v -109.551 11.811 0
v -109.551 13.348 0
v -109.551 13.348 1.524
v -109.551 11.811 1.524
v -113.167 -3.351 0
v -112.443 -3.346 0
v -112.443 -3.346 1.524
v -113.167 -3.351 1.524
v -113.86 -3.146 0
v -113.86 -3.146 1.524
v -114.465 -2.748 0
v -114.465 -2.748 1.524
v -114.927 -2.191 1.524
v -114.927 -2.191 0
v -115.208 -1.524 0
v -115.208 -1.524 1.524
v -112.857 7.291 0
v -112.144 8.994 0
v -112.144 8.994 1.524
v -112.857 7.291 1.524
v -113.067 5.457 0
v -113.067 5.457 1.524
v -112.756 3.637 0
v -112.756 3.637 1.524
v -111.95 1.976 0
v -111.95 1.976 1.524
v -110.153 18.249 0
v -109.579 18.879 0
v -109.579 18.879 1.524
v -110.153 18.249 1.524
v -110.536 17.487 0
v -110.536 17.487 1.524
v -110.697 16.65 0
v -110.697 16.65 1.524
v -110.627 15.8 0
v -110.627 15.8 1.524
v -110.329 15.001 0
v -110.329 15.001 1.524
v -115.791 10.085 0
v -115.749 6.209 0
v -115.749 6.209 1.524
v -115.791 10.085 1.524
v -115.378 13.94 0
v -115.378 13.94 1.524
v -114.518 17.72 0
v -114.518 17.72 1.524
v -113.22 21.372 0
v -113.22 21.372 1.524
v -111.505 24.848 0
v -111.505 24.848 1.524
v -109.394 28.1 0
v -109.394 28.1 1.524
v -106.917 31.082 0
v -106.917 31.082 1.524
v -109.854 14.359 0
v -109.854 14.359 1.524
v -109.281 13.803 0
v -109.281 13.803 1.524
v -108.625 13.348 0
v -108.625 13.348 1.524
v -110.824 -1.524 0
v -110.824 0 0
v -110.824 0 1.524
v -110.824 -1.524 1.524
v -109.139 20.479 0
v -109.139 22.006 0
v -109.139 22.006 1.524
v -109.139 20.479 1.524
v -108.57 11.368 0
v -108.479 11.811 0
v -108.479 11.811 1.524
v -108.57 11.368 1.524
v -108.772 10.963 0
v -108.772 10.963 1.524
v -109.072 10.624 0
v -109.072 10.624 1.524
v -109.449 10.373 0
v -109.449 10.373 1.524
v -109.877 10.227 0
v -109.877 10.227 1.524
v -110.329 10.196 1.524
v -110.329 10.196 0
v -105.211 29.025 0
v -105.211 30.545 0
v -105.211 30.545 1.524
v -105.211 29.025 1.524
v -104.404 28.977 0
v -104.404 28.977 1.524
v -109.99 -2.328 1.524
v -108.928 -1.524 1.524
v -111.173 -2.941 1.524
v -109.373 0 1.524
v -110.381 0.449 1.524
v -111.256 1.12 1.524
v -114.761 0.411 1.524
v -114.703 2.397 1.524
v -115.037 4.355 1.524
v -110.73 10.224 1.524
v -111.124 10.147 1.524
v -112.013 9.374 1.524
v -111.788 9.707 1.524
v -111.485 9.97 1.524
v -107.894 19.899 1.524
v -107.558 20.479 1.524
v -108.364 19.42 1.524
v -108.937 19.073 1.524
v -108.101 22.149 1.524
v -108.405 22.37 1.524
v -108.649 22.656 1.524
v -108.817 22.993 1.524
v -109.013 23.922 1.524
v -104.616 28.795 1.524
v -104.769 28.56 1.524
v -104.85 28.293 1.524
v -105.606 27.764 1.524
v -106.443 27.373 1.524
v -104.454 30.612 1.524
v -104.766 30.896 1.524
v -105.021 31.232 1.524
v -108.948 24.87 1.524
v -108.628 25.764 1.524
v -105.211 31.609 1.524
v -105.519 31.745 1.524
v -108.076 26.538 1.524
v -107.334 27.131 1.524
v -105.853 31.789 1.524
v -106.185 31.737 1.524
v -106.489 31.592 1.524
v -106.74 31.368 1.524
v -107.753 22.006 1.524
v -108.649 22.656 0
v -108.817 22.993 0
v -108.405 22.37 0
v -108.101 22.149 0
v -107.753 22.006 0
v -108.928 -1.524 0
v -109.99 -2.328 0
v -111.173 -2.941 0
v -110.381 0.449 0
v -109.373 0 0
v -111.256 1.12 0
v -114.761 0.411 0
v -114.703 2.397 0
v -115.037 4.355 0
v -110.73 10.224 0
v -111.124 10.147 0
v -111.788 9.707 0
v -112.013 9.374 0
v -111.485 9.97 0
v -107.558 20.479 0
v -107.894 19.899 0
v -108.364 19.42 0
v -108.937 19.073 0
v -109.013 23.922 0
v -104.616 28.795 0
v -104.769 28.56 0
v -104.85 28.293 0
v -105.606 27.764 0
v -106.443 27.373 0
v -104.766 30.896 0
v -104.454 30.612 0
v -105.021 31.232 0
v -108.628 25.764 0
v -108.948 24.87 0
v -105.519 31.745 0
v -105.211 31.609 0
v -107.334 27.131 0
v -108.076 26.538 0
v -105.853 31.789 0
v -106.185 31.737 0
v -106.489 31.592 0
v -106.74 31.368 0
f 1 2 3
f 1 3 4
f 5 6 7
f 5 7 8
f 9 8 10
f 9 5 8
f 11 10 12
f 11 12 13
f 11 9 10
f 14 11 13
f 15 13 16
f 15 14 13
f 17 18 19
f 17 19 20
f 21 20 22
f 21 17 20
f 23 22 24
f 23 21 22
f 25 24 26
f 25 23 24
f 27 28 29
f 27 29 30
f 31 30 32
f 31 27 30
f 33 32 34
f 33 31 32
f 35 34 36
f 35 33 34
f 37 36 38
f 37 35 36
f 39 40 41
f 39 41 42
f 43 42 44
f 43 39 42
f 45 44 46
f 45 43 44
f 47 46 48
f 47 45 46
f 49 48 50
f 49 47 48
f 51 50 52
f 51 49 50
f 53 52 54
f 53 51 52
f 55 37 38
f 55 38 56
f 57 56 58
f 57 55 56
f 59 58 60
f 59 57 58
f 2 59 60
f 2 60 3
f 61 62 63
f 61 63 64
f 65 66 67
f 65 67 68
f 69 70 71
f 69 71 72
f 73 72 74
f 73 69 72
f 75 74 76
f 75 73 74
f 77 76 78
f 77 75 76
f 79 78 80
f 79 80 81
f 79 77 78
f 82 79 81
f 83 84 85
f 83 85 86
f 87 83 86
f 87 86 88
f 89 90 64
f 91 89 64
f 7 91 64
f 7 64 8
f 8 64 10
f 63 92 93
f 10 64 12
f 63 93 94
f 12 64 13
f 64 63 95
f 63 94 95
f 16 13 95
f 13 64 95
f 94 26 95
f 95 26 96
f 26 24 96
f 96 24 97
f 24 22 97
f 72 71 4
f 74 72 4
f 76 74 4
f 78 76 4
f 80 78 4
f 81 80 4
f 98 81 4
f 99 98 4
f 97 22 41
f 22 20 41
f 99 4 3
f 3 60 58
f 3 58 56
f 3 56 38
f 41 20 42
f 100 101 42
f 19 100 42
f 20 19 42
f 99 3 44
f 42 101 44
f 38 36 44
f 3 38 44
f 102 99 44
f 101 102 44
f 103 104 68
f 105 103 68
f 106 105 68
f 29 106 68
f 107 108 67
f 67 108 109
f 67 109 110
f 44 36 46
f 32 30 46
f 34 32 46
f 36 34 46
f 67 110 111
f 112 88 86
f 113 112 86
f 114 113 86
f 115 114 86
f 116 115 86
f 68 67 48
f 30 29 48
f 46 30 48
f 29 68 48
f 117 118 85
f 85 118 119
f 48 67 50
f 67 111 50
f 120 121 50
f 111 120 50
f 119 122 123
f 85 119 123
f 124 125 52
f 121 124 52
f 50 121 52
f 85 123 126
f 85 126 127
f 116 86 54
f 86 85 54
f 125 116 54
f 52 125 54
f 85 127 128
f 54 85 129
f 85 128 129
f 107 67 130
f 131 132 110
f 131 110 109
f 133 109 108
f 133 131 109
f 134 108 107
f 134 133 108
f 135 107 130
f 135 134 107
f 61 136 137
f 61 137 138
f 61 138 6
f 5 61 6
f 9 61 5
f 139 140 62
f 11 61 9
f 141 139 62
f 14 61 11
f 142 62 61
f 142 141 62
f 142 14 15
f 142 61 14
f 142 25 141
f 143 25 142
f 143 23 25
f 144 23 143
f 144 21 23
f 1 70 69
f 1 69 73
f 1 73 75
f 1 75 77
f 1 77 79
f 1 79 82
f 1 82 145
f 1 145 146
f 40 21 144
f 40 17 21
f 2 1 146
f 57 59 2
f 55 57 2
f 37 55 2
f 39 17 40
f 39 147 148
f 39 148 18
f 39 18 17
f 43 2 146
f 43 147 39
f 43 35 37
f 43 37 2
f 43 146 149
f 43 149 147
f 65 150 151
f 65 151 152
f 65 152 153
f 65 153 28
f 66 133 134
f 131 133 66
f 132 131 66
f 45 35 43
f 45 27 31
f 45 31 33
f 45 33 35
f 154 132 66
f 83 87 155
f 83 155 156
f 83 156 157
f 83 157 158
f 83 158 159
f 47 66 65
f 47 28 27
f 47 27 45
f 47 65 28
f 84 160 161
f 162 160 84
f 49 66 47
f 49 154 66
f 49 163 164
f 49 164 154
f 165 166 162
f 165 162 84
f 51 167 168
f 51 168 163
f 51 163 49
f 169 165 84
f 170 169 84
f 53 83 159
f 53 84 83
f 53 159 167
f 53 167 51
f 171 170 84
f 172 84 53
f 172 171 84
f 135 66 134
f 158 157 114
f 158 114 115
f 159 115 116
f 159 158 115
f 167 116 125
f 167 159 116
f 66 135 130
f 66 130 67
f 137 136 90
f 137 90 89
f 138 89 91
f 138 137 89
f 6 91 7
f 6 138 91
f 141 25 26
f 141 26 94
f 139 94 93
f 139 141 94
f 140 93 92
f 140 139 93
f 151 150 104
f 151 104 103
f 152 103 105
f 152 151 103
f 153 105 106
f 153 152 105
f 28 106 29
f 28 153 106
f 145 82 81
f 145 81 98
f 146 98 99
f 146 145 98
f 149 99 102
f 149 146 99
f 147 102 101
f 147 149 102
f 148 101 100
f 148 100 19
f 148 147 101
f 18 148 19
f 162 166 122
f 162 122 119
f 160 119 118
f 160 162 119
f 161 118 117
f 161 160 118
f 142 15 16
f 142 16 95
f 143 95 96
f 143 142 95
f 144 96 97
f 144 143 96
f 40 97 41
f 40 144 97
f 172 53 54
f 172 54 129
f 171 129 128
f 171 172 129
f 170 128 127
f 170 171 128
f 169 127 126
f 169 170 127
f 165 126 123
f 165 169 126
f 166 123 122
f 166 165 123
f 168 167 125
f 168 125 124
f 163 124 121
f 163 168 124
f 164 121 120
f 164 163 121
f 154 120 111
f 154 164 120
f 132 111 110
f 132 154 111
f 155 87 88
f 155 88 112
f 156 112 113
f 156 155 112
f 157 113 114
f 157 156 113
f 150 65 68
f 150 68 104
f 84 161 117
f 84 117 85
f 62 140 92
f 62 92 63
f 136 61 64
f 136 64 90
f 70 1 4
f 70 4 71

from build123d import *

# Parameters (mm, degrees)
BOSS_EXTRUDE1_DEPTH = 1.524


with BuildPart() as part:
    # Sketch1 → Boss-Extrude1 (new body)
    with BuildSketch(Plane.XY):
        with BuildLine():
            Line((-110.824360774, 0), (-110.824360774, -1.524))
            Line((-110.824360774, -1.524), (-108.927743626, -1.524))
            ThreePointArc((-108.927743626, -1.524), (-110.568786986, -2.659932295), (-112.442883949, -3.346318527))
            ThreePointArc((-112.442883949, -3.346318527), (-114.17716098, -2.968961004), (-115.207793415, -1.524))
            ThreePointArc((-115.207793415, -1.524), (-114.703070876, 2.396926331), (-115.749307819, 6.209247985))
            ThreePointArc((-115.749307819, 6.209247985), (-113.92263745, 19.565030778), (-106.916865485, 31.081663004))
            ThreePointArc((-106.916865485, 31.081663004), (-106.184950927, 31.736506317), (-105.211200263, 31.608723968))
            ThreePointArc((-105.211200263, 31.608723968), (-104.901513118, 31.0579276), (-104.454303839, 30.611512291))
            Line((-104.454303839, 30.611512291), (-105.211200263, 30.544825407))
            Line((-105.211200263, 30.544825407), (-105.211200263, 29.025368505))
            Line((-105.211200263, 29.025368505), (-104.403994808, 28.977437337))
            ThreePointArc((-104.403994808, 28.977437337), (-104.700603167, 28.683060455), (-104.849681876, 28.292663471))
            ThreePointArc((-104.849681876, 28.292663471), (-106.016123504, 27.550057971), (-107.333979522, 27.131364149))
            ThreePointArc((-107.333979522, 27.131364149), (-108.818673483, 25.32832607), (-108.817338403, 22.992676119))
            ThreePointArc((-108.817338403, 22.992676119), (-108.405188947, 22.369705182), (-107.752531072, 22.00639036))
            Line((-107.752531072, 22.00639036), (-109.139263732, 22.00639036))
            Line((-109.139263732, 22.00639036), (-109.139263732, 20.478701595))
            Line((-109.139263732, 20.478701595), (-107.557691458, 20.478701595))
            ThreePointArc((-107.557691458, 20.478701595), (-108.363599409, 19.419942847), (-109.579185571, 18.87882549))
            ThreePointArc((-109.579185571, 18.87882549), (-110.645223511, 17.073742216), (-110.328866367, 15.001381081))
            ThreePointArc((-110.328866367, 15.001381081), (-109.579185571, 14.069438674), (-108.625140976, 13.348094888))
            Line((-108.625140976, 13.348094888), (-109.551135599, 13.348094888))
            Line((-109.551135599, 13.348094888), (-109.551135599, 11.811176348))
            Line((-109.551135599, 11.811176348), (-108.478697007, 11.811176348))
            ThreePointArc((-108.478697007, 11.811176348), (-109.071957304, 10.623612067), (-110.328866367, 10.196474724))
            ThreePointArc((-110.328866367, 10.196474724), (-111.484723908, 9.970154225), (-112.1438695, 8.994062677))
            ThreePointArc((-112.1438695, 8.994062677), (-113.066844869, 5.45696931), (-111.950245848, 1.976147619))
            ThreePointArc((-111.950245848, 1.976147619), (-110.838027473, 0.758299628), (-109.373389254, 0))
            Line((-109.373389254, 0), (-110.824360774, 0))
        make_face()
    extrude(amount=BOSS_EXTRUDE1_DEPTH)


solid = part.part
